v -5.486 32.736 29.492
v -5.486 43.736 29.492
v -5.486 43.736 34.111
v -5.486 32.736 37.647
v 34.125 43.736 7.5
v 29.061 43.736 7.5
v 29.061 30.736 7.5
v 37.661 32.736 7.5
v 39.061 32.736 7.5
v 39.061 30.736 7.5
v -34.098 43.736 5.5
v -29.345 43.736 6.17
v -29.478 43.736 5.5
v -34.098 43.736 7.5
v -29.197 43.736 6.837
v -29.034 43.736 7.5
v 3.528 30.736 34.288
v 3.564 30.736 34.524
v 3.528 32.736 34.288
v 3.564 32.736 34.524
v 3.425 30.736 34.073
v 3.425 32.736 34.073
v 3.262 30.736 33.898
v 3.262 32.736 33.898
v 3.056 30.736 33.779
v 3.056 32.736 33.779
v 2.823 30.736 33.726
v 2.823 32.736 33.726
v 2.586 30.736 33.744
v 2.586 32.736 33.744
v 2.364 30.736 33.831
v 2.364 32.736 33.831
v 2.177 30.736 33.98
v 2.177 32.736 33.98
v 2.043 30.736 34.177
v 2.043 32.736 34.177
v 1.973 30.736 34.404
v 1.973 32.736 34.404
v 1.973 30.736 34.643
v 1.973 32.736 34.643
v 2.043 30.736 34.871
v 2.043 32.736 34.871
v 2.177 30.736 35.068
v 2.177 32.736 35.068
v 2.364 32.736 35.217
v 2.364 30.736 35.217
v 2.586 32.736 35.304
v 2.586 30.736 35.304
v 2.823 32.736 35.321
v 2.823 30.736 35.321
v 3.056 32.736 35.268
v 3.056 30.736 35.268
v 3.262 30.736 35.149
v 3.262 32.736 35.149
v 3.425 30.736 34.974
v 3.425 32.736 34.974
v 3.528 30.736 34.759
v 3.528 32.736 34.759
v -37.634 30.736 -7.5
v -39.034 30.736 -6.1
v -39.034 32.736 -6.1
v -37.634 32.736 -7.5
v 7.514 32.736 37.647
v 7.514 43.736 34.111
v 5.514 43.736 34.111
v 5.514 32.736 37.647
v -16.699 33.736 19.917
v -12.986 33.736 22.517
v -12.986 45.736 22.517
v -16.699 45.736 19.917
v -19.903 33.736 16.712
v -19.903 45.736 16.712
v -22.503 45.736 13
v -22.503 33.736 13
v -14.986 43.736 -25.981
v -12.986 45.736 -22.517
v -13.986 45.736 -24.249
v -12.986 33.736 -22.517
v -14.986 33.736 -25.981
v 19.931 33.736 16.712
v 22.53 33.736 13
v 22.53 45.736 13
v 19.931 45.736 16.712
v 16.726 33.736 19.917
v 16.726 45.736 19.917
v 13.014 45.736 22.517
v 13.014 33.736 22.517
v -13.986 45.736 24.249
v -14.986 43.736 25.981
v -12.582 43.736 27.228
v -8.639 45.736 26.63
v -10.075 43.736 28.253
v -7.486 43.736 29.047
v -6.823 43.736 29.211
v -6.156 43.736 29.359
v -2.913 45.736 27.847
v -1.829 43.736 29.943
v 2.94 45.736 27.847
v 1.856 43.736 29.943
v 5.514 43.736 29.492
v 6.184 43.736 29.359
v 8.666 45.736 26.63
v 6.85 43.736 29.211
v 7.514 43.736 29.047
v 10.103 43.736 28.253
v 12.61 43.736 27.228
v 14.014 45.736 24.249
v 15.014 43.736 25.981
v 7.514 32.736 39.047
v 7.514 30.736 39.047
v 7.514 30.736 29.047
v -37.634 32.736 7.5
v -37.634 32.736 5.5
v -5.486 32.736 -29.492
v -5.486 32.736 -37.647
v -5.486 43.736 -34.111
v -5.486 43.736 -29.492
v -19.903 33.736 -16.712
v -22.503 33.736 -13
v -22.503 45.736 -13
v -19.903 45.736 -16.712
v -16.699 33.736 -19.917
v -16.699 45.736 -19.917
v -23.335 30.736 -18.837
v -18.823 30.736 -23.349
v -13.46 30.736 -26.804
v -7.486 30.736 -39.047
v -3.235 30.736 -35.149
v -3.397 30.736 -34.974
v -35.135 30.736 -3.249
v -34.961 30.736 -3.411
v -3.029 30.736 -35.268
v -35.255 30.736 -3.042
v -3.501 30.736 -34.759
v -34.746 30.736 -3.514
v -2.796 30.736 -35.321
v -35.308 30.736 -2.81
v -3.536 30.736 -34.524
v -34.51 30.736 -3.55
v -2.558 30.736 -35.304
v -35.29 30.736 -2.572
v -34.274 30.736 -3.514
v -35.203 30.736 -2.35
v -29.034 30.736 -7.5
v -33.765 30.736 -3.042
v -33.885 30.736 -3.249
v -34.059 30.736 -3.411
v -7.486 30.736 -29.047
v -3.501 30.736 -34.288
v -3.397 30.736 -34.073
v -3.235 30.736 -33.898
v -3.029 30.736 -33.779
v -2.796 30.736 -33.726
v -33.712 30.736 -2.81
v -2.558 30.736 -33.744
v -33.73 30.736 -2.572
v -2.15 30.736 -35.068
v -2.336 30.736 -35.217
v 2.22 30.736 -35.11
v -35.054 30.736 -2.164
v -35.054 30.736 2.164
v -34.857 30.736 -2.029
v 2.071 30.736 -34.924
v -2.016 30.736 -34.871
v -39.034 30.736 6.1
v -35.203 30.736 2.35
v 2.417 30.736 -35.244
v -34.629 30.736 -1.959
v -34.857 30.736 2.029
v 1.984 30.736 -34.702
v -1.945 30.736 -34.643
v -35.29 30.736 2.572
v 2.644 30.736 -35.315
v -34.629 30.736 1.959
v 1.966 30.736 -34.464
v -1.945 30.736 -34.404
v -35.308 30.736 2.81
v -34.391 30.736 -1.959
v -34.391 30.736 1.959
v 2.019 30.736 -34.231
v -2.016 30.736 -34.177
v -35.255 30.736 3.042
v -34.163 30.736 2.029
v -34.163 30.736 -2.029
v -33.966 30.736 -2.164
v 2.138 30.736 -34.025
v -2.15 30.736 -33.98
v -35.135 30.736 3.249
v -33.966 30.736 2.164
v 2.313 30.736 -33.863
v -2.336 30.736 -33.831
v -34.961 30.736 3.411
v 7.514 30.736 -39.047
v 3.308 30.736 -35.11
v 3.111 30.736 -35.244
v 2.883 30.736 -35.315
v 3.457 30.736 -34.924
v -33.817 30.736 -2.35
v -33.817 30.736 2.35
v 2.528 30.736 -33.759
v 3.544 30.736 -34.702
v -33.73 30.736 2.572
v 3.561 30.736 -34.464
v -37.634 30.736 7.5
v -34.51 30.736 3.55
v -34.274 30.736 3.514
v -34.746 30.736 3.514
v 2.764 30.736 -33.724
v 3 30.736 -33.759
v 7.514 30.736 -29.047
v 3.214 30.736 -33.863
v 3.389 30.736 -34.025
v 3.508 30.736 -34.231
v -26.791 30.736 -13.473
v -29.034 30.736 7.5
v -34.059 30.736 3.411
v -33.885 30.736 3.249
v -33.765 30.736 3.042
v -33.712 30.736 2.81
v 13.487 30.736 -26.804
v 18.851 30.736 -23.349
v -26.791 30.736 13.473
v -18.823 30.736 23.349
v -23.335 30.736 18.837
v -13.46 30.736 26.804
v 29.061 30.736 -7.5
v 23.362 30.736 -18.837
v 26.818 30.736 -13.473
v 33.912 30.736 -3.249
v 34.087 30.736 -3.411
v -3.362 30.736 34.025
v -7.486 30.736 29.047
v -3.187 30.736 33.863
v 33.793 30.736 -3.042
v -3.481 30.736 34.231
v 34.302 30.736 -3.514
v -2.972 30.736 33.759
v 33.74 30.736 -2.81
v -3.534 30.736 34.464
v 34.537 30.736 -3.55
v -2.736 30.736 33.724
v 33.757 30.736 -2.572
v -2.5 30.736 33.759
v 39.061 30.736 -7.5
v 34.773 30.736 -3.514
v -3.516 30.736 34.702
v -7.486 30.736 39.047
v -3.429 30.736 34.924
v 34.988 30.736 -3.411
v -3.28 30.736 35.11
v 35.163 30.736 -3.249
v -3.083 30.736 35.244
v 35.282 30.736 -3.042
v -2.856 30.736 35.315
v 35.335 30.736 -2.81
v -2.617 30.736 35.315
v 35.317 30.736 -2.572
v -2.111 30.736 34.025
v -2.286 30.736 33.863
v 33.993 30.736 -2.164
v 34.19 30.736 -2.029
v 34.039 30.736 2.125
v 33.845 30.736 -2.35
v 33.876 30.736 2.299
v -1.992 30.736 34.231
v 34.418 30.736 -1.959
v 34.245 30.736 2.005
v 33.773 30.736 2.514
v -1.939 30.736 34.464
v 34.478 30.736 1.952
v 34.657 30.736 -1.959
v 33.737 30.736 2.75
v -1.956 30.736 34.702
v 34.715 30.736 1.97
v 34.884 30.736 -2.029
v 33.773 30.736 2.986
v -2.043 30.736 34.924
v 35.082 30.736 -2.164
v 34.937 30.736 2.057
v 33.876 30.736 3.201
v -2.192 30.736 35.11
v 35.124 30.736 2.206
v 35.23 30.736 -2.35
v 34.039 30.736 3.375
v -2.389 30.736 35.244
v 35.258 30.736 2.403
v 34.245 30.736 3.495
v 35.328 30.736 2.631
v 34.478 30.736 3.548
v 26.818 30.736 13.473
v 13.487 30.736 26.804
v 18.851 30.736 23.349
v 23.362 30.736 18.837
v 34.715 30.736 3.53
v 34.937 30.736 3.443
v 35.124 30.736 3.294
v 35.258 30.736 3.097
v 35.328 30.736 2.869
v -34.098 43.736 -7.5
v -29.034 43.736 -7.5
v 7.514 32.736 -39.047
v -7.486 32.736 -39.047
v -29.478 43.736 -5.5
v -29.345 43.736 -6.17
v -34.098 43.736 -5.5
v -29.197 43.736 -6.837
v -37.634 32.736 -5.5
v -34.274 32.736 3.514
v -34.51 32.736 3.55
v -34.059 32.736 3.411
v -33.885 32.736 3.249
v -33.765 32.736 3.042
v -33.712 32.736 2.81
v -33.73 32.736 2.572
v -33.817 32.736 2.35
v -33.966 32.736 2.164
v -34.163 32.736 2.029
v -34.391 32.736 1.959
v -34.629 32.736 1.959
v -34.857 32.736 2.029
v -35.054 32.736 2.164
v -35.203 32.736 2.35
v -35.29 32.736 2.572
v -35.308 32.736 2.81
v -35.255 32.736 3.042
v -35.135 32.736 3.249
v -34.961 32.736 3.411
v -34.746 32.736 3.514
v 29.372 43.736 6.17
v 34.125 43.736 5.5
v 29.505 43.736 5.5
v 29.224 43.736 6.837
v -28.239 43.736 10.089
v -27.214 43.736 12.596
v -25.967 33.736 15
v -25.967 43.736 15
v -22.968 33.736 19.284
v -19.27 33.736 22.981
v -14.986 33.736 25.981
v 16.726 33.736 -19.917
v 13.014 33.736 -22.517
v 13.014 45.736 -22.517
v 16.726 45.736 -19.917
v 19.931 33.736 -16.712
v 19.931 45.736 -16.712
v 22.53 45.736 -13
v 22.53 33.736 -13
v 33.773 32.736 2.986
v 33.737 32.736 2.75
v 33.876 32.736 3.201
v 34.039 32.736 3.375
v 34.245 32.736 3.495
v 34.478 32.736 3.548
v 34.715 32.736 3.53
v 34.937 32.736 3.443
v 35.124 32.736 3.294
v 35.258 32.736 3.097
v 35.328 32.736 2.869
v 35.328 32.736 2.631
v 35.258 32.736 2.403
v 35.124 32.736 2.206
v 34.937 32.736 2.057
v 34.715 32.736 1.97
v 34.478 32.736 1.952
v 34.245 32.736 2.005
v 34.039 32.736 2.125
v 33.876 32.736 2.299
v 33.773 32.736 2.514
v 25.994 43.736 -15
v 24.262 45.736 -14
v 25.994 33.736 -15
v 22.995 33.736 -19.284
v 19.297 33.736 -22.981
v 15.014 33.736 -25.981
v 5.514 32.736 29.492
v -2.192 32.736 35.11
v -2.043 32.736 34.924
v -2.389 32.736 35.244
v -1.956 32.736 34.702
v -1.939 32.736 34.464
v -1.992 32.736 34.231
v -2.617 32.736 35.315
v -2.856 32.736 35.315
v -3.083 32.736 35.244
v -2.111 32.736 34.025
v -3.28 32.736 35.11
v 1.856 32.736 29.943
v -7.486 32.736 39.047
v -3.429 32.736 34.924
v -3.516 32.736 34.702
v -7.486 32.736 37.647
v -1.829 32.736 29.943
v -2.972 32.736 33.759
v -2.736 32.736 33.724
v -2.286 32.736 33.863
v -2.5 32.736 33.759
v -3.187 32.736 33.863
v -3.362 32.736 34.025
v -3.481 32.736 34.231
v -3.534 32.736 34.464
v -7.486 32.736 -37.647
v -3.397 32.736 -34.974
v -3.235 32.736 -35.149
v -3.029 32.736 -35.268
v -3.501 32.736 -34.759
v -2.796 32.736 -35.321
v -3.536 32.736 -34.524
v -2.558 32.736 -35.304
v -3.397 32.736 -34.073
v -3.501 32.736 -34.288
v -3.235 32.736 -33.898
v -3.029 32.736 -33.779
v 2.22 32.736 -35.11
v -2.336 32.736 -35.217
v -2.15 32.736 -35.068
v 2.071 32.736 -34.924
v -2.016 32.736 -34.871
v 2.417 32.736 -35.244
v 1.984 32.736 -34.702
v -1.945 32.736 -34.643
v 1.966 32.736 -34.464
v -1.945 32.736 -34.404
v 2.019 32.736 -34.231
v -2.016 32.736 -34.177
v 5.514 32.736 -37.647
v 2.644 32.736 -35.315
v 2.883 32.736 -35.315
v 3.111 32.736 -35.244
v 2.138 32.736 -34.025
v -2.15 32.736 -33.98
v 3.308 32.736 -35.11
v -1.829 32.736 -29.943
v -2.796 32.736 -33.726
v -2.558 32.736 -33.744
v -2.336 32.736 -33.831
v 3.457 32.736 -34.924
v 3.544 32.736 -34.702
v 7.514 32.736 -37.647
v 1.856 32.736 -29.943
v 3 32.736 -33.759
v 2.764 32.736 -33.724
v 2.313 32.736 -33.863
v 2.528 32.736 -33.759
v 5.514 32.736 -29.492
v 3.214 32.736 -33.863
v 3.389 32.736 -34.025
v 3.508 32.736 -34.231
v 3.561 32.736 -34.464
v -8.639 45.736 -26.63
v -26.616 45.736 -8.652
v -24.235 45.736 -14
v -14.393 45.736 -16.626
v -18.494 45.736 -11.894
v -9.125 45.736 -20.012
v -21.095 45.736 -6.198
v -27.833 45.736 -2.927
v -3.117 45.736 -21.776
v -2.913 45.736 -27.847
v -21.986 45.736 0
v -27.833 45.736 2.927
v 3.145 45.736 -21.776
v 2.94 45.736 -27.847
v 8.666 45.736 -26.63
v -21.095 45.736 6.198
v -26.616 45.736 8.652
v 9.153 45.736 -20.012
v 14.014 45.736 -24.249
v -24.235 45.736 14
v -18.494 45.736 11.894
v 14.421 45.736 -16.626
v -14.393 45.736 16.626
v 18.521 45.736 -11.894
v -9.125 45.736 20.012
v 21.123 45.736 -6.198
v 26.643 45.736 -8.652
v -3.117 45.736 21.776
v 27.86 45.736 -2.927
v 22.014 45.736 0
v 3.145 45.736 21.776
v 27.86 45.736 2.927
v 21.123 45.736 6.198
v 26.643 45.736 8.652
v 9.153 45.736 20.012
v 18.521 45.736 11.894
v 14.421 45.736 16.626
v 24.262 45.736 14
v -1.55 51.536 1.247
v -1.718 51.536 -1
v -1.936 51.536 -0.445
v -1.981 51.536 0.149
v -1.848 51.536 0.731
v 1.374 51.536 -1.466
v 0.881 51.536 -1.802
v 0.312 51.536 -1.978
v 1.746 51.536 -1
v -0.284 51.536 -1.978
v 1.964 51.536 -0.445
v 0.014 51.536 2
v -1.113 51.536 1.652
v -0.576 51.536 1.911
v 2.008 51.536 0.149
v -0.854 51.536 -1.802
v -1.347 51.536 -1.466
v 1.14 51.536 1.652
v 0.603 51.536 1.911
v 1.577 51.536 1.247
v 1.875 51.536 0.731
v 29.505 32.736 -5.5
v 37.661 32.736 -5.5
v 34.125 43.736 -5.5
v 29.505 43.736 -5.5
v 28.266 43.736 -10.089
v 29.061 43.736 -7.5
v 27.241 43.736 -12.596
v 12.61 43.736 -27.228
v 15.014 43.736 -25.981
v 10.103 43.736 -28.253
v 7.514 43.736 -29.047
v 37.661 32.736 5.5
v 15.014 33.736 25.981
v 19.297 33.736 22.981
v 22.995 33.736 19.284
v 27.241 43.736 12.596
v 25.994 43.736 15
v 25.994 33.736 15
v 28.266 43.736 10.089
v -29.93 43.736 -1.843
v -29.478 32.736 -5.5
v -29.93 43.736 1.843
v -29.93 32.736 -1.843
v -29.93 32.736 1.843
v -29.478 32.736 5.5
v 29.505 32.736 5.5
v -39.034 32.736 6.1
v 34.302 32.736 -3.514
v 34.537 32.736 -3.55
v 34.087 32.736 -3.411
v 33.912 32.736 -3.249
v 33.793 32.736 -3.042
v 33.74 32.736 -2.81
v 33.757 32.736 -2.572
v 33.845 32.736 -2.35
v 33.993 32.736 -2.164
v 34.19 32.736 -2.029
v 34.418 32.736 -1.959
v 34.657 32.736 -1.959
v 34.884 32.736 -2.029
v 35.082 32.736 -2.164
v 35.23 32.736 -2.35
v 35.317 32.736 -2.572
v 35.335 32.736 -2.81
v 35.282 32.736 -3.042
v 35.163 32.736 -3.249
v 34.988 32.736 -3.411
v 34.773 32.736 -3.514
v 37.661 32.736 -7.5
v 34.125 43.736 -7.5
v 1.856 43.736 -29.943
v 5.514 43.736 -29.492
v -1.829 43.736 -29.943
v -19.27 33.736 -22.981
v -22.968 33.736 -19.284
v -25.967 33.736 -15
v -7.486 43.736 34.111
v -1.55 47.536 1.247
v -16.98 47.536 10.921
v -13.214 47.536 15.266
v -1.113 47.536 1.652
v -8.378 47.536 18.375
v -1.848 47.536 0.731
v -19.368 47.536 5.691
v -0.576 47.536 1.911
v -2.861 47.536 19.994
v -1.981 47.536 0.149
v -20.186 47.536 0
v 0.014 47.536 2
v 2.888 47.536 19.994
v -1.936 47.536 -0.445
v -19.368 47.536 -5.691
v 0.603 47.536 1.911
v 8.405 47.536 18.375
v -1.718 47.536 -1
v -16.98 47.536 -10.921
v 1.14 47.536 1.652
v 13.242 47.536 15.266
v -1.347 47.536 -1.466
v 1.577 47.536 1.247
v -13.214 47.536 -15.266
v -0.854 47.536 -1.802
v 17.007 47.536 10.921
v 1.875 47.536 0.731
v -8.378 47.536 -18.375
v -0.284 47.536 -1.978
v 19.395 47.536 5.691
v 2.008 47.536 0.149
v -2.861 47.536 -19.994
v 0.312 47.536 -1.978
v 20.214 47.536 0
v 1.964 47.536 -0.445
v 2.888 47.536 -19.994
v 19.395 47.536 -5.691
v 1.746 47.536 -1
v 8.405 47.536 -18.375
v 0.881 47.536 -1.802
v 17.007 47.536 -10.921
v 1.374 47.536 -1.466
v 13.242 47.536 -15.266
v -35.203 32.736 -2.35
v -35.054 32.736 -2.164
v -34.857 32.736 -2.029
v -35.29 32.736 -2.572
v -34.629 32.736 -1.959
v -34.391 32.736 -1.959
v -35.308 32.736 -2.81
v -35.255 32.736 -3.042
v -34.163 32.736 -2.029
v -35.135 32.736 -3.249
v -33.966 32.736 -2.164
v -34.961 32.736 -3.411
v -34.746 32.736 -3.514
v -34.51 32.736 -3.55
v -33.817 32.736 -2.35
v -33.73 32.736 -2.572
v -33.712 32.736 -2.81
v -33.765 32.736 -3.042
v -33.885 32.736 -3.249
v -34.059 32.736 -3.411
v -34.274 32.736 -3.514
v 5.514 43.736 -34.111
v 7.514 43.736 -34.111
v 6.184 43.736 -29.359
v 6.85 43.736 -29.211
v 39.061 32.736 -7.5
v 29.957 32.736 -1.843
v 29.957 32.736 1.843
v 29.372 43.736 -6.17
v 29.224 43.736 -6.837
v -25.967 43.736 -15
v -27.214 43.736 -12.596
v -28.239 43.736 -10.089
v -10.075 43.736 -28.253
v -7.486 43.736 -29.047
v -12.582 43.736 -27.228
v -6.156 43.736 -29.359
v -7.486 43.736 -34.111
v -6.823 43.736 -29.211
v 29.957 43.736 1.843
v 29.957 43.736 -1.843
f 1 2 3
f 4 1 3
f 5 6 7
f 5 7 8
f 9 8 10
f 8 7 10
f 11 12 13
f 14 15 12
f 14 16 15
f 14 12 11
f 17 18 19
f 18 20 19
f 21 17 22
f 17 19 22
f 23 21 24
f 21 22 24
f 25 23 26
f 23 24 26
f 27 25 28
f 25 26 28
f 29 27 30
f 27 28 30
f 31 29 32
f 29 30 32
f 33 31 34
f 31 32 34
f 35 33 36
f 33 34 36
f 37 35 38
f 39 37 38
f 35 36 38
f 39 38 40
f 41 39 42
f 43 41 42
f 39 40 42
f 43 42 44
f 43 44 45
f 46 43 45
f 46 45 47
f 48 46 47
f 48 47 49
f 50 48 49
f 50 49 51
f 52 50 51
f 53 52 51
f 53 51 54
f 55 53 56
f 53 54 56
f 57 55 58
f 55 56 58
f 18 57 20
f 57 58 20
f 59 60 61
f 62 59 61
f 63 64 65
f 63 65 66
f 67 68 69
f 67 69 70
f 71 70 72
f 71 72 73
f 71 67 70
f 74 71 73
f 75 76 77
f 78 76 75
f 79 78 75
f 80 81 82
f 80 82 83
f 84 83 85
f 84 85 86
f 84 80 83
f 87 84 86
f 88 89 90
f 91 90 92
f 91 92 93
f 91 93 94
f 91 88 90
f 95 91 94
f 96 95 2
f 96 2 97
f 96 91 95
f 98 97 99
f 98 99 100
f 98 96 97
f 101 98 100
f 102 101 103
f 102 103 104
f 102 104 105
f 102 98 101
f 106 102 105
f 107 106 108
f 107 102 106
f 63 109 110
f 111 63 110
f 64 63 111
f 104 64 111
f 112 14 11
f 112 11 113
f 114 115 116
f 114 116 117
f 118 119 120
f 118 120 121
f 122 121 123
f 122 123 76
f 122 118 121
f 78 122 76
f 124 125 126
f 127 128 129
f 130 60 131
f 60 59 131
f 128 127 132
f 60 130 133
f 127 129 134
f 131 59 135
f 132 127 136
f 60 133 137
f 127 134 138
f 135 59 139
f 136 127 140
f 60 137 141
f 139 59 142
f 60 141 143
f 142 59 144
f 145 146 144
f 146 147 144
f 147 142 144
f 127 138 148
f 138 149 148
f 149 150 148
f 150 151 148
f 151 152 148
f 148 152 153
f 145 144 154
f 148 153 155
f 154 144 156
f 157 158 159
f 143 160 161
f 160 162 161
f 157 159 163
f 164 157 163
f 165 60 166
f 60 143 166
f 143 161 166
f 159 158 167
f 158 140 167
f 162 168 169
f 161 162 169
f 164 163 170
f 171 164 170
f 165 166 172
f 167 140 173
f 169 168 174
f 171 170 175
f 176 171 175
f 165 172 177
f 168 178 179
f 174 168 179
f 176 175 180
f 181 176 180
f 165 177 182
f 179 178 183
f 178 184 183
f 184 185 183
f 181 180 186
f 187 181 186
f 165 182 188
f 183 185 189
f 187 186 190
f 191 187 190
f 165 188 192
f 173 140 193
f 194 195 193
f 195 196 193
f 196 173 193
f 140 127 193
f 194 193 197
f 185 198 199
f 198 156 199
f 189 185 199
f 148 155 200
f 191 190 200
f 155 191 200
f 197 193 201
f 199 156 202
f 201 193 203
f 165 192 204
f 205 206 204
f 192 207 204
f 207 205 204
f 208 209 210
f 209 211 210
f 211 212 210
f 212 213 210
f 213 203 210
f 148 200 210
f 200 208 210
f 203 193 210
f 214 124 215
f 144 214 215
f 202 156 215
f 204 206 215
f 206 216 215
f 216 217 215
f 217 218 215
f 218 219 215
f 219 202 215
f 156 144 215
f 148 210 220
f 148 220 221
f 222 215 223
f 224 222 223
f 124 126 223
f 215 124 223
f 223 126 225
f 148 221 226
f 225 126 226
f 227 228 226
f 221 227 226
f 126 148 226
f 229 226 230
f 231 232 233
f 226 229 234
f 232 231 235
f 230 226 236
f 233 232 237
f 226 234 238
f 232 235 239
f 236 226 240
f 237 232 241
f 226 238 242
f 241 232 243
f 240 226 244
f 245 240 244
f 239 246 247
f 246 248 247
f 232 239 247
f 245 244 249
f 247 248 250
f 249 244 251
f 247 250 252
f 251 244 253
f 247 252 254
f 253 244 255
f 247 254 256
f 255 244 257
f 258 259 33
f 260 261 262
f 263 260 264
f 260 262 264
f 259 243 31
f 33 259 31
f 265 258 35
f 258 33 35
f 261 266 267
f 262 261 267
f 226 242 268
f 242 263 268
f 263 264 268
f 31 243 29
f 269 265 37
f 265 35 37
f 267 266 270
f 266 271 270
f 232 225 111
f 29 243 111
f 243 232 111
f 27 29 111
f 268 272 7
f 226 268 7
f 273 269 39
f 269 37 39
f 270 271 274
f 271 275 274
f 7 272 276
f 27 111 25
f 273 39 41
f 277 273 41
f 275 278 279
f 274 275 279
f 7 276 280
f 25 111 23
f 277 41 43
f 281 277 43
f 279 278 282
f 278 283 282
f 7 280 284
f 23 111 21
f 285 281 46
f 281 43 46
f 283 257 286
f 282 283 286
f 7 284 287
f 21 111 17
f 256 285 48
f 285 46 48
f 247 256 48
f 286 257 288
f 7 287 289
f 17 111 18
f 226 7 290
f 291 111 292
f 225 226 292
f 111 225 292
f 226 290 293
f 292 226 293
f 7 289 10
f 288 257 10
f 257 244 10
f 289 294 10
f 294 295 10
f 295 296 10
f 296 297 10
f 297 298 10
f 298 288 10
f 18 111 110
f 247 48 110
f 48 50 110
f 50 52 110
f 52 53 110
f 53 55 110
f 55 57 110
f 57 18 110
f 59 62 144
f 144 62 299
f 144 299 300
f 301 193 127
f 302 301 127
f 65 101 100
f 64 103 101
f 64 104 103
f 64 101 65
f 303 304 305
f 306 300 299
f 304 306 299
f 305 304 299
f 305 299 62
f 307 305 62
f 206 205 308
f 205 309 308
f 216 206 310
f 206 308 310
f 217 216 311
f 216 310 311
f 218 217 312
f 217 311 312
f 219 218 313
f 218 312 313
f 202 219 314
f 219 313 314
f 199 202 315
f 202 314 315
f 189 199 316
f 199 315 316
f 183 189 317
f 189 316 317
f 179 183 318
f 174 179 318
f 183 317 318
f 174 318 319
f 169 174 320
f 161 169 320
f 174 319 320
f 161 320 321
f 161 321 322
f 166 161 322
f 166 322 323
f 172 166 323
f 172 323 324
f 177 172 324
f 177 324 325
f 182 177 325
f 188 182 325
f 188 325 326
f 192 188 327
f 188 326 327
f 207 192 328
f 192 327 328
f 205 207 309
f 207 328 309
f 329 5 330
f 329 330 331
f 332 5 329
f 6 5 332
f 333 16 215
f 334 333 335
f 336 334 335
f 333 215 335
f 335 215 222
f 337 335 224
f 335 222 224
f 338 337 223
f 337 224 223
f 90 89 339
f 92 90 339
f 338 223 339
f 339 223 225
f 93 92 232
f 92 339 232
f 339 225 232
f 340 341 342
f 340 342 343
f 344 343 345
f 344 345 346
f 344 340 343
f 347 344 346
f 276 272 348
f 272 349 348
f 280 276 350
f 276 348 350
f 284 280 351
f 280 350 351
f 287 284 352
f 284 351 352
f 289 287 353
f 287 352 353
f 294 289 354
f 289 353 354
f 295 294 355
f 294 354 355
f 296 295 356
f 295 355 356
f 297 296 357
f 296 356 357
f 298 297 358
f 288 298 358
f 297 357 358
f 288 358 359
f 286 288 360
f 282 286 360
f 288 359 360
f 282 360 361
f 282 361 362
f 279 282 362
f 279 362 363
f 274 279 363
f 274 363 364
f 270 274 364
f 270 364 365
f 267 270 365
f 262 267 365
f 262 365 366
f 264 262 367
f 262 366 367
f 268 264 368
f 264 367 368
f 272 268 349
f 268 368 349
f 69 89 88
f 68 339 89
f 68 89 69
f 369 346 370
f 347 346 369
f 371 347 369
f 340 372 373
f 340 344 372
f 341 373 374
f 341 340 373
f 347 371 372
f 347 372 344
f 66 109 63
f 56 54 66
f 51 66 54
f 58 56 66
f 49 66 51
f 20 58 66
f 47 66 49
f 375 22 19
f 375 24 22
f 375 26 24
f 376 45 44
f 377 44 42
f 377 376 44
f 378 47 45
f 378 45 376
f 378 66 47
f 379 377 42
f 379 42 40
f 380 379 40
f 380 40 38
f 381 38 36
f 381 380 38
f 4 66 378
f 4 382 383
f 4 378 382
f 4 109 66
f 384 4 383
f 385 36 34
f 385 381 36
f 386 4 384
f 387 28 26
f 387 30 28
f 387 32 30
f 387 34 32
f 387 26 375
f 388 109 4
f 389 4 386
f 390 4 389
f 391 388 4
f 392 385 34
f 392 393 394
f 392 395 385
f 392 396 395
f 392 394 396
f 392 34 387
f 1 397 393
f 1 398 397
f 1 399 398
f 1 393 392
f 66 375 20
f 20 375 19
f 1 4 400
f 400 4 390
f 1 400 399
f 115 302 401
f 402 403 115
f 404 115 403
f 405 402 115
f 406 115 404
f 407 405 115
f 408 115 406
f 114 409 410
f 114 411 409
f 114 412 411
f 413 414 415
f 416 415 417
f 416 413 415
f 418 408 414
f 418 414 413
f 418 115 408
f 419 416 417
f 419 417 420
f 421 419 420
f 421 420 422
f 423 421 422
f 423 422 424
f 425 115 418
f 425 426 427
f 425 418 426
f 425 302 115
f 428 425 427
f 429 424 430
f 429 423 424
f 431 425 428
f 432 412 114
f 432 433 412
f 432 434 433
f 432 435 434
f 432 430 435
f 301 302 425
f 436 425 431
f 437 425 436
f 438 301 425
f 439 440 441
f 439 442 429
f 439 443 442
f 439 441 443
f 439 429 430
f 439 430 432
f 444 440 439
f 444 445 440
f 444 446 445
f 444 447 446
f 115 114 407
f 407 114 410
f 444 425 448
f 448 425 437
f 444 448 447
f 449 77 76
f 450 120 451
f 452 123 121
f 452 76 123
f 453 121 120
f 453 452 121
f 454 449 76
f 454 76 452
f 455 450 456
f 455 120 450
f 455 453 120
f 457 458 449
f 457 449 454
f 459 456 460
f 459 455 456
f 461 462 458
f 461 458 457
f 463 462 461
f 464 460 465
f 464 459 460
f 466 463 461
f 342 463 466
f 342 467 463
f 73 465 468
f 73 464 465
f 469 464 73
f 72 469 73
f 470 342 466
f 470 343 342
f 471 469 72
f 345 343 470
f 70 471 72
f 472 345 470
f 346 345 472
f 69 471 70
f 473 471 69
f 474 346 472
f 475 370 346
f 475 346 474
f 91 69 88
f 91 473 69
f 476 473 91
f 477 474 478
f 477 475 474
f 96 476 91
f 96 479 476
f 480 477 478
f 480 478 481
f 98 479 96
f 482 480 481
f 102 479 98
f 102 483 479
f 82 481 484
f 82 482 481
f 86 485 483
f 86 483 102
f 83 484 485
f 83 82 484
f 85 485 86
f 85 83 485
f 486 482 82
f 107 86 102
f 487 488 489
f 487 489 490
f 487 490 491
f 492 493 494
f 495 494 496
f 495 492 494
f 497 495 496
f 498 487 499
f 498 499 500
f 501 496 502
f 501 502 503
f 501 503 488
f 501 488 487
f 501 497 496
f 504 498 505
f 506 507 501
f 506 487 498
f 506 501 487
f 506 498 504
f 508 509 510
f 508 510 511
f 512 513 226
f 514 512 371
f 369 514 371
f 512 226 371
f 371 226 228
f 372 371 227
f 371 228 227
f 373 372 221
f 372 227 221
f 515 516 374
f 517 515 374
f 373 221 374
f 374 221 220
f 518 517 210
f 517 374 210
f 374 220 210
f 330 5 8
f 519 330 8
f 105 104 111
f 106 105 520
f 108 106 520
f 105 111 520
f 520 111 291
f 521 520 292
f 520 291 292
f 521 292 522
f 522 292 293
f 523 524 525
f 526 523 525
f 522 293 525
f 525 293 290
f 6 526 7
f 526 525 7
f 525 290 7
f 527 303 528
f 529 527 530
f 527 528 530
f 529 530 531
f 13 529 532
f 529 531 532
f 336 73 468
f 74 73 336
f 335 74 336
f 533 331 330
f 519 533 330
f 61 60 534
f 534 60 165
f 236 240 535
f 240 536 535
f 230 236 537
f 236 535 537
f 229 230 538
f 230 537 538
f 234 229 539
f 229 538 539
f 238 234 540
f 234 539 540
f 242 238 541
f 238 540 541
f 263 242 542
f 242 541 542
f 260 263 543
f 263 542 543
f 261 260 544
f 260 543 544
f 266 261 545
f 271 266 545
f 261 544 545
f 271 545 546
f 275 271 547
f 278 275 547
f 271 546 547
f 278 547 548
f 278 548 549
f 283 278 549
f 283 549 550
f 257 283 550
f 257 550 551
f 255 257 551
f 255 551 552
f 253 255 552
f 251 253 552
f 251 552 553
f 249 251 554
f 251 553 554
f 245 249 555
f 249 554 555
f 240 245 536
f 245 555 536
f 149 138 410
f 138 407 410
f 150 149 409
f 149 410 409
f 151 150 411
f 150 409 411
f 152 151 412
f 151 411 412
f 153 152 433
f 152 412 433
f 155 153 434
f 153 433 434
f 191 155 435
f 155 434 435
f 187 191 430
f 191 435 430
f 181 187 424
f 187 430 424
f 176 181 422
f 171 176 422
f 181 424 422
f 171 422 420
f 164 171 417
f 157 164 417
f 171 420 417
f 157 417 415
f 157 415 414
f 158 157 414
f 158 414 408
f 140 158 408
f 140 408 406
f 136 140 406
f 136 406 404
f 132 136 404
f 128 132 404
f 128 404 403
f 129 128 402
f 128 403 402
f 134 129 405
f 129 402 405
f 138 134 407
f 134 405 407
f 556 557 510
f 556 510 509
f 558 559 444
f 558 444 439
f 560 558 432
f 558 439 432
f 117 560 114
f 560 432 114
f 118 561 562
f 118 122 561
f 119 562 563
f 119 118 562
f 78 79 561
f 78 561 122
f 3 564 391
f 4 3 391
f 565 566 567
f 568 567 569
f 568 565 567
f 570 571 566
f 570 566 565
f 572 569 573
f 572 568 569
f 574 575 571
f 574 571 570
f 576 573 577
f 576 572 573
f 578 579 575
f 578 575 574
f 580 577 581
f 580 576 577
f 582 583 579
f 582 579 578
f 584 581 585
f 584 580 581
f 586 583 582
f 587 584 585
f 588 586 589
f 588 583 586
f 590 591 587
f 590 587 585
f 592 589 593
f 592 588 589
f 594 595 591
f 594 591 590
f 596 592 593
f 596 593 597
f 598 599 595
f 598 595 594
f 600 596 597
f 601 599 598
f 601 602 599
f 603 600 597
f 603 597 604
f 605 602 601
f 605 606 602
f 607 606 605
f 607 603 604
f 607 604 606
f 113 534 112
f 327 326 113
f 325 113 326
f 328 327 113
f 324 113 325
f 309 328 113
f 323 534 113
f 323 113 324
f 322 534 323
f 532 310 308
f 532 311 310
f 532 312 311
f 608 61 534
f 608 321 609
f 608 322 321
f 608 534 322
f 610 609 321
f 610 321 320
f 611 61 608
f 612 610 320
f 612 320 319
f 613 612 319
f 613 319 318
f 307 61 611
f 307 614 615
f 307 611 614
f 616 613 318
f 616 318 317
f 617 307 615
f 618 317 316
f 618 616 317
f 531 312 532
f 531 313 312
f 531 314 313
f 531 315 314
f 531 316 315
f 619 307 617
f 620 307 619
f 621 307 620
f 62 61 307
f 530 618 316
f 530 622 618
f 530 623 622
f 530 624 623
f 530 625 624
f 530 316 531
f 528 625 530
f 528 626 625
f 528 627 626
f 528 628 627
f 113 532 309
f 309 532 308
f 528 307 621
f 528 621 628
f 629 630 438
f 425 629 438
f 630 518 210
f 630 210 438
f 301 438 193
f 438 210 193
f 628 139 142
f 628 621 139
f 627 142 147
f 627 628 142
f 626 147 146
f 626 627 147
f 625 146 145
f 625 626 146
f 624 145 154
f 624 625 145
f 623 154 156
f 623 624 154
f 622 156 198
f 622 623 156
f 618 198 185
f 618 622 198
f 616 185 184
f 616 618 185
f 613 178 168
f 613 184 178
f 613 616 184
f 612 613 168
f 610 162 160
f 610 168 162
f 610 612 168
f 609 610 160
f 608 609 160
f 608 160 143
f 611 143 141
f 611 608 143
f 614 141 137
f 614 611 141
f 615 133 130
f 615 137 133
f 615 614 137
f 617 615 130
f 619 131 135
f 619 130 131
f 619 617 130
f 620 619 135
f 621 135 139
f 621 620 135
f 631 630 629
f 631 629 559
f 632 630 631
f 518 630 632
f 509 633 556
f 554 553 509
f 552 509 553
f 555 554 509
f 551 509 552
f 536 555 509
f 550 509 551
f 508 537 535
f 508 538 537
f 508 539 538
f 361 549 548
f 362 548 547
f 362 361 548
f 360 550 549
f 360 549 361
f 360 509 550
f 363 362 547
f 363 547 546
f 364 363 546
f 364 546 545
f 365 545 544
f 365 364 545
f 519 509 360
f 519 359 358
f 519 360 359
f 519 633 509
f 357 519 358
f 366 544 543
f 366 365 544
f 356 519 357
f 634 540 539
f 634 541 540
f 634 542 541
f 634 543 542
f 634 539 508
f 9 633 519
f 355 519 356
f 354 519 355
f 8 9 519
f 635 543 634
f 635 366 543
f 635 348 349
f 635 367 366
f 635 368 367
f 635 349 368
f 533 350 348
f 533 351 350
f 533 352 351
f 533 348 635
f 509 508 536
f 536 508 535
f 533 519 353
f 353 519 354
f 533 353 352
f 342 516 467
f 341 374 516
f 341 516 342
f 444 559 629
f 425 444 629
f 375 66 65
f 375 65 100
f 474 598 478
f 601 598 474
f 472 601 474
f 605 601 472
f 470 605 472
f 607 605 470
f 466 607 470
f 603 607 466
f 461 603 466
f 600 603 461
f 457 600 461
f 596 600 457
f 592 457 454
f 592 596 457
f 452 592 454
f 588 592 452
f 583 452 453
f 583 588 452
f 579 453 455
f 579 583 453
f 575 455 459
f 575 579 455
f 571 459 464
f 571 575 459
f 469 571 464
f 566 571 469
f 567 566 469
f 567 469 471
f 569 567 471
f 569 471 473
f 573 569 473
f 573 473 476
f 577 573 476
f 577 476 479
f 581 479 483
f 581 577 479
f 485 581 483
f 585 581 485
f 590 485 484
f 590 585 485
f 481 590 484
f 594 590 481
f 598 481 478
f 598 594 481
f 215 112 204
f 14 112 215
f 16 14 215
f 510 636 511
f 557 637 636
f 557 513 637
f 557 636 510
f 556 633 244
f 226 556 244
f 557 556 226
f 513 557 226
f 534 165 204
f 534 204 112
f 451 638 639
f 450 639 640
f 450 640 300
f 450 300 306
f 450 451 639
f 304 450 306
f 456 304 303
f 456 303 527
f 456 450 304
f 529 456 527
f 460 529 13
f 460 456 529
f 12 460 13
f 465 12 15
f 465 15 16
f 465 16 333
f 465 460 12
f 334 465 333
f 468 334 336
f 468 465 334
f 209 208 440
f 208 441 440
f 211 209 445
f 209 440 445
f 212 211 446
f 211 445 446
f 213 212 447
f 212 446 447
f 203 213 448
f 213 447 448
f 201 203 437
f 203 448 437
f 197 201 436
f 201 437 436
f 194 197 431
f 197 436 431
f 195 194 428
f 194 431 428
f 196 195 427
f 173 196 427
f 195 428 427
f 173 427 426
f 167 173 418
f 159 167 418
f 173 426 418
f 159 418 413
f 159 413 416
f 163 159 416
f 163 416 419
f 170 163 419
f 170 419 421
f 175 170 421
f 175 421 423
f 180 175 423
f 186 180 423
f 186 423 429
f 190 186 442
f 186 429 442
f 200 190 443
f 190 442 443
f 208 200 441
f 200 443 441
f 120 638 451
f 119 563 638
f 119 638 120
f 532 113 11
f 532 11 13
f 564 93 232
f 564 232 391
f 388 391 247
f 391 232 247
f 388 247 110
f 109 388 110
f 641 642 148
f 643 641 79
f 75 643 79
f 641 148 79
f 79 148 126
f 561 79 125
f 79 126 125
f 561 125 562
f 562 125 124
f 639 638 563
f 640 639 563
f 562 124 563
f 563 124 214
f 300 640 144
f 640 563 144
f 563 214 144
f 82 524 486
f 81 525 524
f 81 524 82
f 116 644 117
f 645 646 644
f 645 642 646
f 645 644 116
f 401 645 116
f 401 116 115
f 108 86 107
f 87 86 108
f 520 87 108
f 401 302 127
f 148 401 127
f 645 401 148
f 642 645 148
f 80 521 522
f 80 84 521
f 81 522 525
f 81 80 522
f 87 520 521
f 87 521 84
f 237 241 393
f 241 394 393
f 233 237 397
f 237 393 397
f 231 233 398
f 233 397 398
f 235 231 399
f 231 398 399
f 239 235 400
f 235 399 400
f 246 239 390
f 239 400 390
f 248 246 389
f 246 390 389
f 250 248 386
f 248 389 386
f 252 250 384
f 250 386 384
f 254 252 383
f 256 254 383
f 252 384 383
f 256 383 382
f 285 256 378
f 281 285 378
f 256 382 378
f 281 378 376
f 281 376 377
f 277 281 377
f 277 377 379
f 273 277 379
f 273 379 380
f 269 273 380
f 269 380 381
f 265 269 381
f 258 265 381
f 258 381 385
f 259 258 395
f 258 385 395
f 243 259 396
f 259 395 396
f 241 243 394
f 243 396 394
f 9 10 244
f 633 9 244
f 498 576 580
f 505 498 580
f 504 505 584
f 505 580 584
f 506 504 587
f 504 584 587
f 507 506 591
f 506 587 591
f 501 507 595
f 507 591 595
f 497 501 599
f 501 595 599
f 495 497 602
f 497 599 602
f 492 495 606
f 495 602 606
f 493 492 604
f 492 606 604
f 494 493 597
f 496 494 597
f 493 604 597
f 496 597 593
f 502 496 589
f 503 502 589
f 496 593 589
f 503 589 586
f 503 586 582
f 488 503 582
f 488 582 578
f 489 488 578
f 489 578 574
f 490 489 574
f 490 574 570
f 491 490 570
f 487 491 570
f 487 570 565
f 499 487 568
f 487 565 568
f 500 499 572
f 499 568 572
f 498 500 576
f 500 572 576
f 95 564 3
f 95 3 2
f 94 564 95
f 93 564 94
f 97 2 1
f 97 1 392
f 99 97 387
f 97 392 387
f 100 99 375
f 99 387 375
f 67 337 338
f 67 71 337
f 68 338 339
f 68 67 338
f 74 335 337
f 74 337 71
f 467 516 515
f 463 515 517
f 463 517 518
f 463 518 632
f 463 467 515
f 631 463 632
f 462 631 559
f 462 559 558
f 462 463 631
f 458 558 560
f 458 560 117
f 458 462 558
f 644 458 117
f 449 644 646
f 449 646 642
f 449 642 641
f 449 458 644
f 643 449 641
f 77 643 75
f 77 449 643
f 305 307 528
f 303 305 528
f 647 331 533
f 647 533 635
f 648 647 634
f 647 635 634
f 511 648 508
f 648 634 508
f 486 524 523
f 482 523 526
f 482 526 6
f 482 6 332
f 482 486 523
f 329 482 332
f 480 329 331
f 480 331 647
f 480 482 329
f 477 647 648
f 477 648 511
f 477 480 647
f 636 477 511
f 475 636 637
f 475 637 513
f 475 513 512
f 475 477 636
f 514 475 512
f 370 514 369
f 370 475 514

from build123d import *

# Parameters (mm, degrees)
SKETCH1_R                   = 150
BOSS_EXTRUDE1_DEPTH         = 75
CHAMFER1_SIZE               = 10
BOSS_EXTRUDE2_START         = -75
BOSS_EXTRUDE2_DEPTH         = 10
CHAMFER2_SIZE               = 7
BOSS_EXTRUDE3_DEPTH         = 10
SKETCH4_R                   = 4
CUT_EXTRUDE1_DEPTH          = 255.641782801
CIRPATTERN1_COUNT           = 4
CIRPATTERN1_COPY_1_DEPTH    = 10
CIRPATTERN1_COPY_2_DEPTH    = 10
CIRPATTERN1_COPY_3_DEPTH    = 10
CIRPATTERN1_COPY_4_SKETCH_R = 4
CIRPATTERN1_COPY_4_DEPTH    = 255.641782801
CIRPATTERN1_COPY_5_SKETCH_R = 4
CIRPATTERN1_COPY_5_DEPTH    = 255.641782801
CIRPATTERN1_COPY_6_SKETCH_R = 4
CIRPATTERN1_COPY_6_DEPTH    = 255.641782801
CUT_EXTRUDE2_START          = -60
CUT_EXTRUDE2_DEPTH          = 347.111647957
CIRPATTERN2_COUNT           = 4
SKETCH6_R                   = 110
BOSS_EXTRUDE4_DEPTH         = 9
BOSS_EXTRUDE4_TAPER         = 45
SKETCH7_R                   = 10
BOSS_EXTRUDE5_DEPTH         = 20
L_EK1_SCALE                 = 0.2


with BuildPart() as part:
    # Sketch1 → Boss-Extrude1 (new body)
    with BuildSketch(Plane(origin=(0, 0, 0), x_dir=(1, 0, 0), z_dir=(0, 1, 0))):
        with Locations(Location((0, 0, 0), (0, 0, 270))):
            Circle(SKETCH1_R)
    extrude(amount=BOSS_EXTRUDE1_DEPTH)

    # Chamfer1
    chamfer1_edges = [part.edges().sort_by_distance(p)[0] for p in [
        (0, 75, -150),
    ]]
    chamfer(chamfer1_edges, length=CHAMFER1_SIZE)

    # Sketch2 → Boss-Extrude2 (add)
    with BuildSketch(Plane(origin=(0, 75, 0), x_dir=(1, 0, 0), z_dir=(0, 1, 0)).offset(BOSS_EXTRUDE2_START)):
        with BuildLine():
            Line((-195.236875483, 37.5), (-195.236875483, -37.5))
            Line((-195.236875483, -37.5), (-145.236875483, -37.5))
            ThreePointArc((-145.236875483, -37.5), (-150, 0), (-145.236875483, 37.5))
            Line((-145.236875483, 37.5), (-195.236875483, 37.5))
        make_face()
    boss_extrude2 = extrude(amount=BOSS_EXTRUDE2_DEPTH)

    # Chamfer2
    chamfer2_edges = [part.edges().sort_by_distance(p)[0] for p in [
        (-195.236875483, 5, 37.5),
        (-195.236875483, 5, -37.5),
    ]]
    chamfer(chamfer2_edges, length=CHAMFER2_SIZE)

    # Sketch3 → Boss-Extrude3 (add)
    with BuildSketch(Plane.XY.offset(37.5)):
        Polygon((-150, 65), (-170.556875483, 65), (-188.236875483, 10), (-188.236875483, 0), (-145.236875483, 0), (-145.236875483, 65), align=None)
    boss_extrude3 = extrude(amount=-BOSS_EXTRUDE3_DEPTH)

    # Sketch4 → Cut-Extrude1 (cut, symmetric)
    with BuildSketch(Plane(origin=(0, 10, 0), x_dir=(1, 0, 0), z_dir=(0, 1, 0))):
        with Locations(Location((-172.618437741, -13.75, 0), (0, 0, 270))):
            Circle(SKETCH4_R)
    cut_extrude1 = extrude(amount=CUT_EXTRUDE1_DEPTH, both=True, mode=Mode.SUBTRACT)

    # Mirror1: Boss-Extrude3, Cut-Extrude1 across plane
    add(boss_extrude3.mirror(Plane.XY))
    add(cut_extrude1.mirror(Plane.XY), mode=Mode.SUBTRACT)

    # CirPattern1: Boss-Extrude2, Boss-Extrude3, Cut-Extrude1 ×4 about axis
    cirpattern1_axis = Axis((0, 0, 0), (0, 1, 0))
    add([boss_extrude2.rotate(cirpattern1_axis, i * 360 / CIRPATTERN1_COUNT) for i in range(1, CIRPATTERN1_COUNT)])
    add([boss_extrude3.rotate(cirpattern1_axis, i * 360 / CIRPATTERN1_COUNT) for i in range(1, CIRPATTERN1_COUNT)])
    add([cut_extrude1.rotate(cirpattern1_axis, i * 360 / CIRPATTERN1_COUNT) for i in range(1, CIRPATTERN1_COUNT)], mode=Mode.SUBTRACT)

    # CirPattern1 copy 1 sketch → CirPattern1 copy 1 (add)
    with BuildSketch(Plane(origin=(-37.5, 0, 0), x_dir=(0, 0, -1), z_dir=(-1, 0, 0))):
        Polygon((-150, -65), (-170.556875483, -65), (-188.236875483, -10), (-188.236875483, 0), (-145.236875483, 0), (-145.236875483, -65), align=None)
    extrude(amount=-CIRPATTERN1_COPY_1_DEPTH)

    # CirPattern1 copy 2 sketch → CirPattern1 copy 2 (add)
    with BuildSketch(Plane(origin=(0, 0, 37.5), x_dir=(-1, 0, 0), z_dir=(0, 0, 1))):
        Polygon((-150, -65), (-170.556875483, -65), (-188.236875483, -10), (-188.236875483, 0), (-145.236875483, 0), (-145.236875483, -65), align=None)
    extrude(amount=-CIRPATTERN1_COPY_2_DEPTH)

    # CirPattern1 copy 3 sketch → CirPattern1 copy 3 (add)
    with BuildSketch(Plane(origin=(37.5, 0, 0), x_dir=(0, 0, 1), z_dir=(1, 0, 0))):
        Polygon((-150, -65), (-170.556875483, -65), (-188.236875483, -10), (-188.236875483, 0), (-145.236875483, 0), (-145.236875483, -65), align=None)
    extrude(amount=-CIRPATTERN1_COPY_3_DEPTH)

    # CirPattern1 copy 4 sketch → CirPattern1 copy 4 (cut, symmetric)
    with BuildSketch(Plane(origin=(0, 10, 0), x_dir=(0, 0, -1), z_dir=(0, 1, 0))):
        with Locations((-172.618437741, 13.75)):
            Circle(CIRPATTERN1_COPY_4_SKETCH_R)
    extrude(amount=CIRPATTERN1_COPY_4_DEPTH, both=True, mode=Mode.SUBTRACT)

    # CirPattern1 copy 5 sketch → CirPattern1 copy 5 (cut, symmetric)
    with BuildSketch(Plane(origin=(0, 10, 0), x_dir=(-1, 0, 0), z_dir=(0, 1, 0))):
        with Locations((-172.618437741, 13.75)):
            Circle(CIRPATTERN1_COPY_5_SKETCH_R)
    extrude(amount=CIRPATTERN1_COPY_5_DEPTH, both=True, mode=Mode.SUBTRACT)

    # CirPattern1 copy 6 sketch → CirPattern1 copy 6 (cut, symmetric)
    with BuildSketch(Plane.ZX.offset(10)):
        with Locations((-172.618437741, 13.75)):
            Circle(CIRPATTERN1_COPY_6_SKETCH_R)
    extrude(amount=CIRPATTERN1_COPY_6_DEPTH, both=True, mode=Mode.SUBTRACT)

    # Sketch5 → Cut-Extrude2 (cut)
    with BuildSketch(Plane(origin=(0, 75, 0), x_dir=(1, 0, 0), z_dir=(0, 1, 0)).offset(CUT_EXTRUDE2_START)):
        with BuildLine():
            Line((-112.583302492, -65), (-129.903810568, -75))
            ThreePointArc((-129.903810568, -75), (-106.066017178, -106.066017178), (-75, -129.903810568))
            Line((-75, -129.903810568), (-65, -112.583302492))
            ThreePointArc((-65, -112.583302492), (-91.923881554, -91.923881554), (-112.583302492, -65))
        make_face()
    cut_extrude2 = extrude(amount=CUT_EXTRUDE2_DEPTH, mode=Mode.SUBTRACT)

    # CirPattern2: Cut-Extrude2 ×4 about axis
    cirpattern2_axis = Axis((0, 75, 0), (0, -1, 0))
    for i in range(1, CIRPATTERN2_COUNT):
        add(cut_extrude2.rotate(cirpattern2_axis, i * 360 / CIRPATTERN2_COUNT), mode=Mode.SUBTRACT)

    # Sketch6 → Boss-Extrude4 (add)
    with BuildSketch(Plane(origin=(0, 75, 0), x_dir=(1, 0, 0), z_dir=(0, 1, 0))):
        Circle(SKETCH6_R)
    extrude(amount=BOSS_EXTRUDE4_DEPTH, taper=BOSS_EXTRUDE4_TAPER)

    # Sketch7 → Boss-Extrude5 (add)
    with BuildSketch(Plane(origin=(0, 84, 0), x_dir=(1, 0, 0), z_dir=(0, 1, 0))):
        with Locations(Location((0, 0, 0), (0, 0, 270))):
            Circle(SKETCH7_R)
    extrude(amount=BOSS_EXTRUDE5_DEPTH)


with BuildPart() as part_1:
    # Ölçek1: scaled about (0.0171202, 38.41973145, 0)
    add(part.part.scale(L_EK1_SCALE).moved(Location((0.01369616, 30.73578516, 0))))


solid = part_1.part
